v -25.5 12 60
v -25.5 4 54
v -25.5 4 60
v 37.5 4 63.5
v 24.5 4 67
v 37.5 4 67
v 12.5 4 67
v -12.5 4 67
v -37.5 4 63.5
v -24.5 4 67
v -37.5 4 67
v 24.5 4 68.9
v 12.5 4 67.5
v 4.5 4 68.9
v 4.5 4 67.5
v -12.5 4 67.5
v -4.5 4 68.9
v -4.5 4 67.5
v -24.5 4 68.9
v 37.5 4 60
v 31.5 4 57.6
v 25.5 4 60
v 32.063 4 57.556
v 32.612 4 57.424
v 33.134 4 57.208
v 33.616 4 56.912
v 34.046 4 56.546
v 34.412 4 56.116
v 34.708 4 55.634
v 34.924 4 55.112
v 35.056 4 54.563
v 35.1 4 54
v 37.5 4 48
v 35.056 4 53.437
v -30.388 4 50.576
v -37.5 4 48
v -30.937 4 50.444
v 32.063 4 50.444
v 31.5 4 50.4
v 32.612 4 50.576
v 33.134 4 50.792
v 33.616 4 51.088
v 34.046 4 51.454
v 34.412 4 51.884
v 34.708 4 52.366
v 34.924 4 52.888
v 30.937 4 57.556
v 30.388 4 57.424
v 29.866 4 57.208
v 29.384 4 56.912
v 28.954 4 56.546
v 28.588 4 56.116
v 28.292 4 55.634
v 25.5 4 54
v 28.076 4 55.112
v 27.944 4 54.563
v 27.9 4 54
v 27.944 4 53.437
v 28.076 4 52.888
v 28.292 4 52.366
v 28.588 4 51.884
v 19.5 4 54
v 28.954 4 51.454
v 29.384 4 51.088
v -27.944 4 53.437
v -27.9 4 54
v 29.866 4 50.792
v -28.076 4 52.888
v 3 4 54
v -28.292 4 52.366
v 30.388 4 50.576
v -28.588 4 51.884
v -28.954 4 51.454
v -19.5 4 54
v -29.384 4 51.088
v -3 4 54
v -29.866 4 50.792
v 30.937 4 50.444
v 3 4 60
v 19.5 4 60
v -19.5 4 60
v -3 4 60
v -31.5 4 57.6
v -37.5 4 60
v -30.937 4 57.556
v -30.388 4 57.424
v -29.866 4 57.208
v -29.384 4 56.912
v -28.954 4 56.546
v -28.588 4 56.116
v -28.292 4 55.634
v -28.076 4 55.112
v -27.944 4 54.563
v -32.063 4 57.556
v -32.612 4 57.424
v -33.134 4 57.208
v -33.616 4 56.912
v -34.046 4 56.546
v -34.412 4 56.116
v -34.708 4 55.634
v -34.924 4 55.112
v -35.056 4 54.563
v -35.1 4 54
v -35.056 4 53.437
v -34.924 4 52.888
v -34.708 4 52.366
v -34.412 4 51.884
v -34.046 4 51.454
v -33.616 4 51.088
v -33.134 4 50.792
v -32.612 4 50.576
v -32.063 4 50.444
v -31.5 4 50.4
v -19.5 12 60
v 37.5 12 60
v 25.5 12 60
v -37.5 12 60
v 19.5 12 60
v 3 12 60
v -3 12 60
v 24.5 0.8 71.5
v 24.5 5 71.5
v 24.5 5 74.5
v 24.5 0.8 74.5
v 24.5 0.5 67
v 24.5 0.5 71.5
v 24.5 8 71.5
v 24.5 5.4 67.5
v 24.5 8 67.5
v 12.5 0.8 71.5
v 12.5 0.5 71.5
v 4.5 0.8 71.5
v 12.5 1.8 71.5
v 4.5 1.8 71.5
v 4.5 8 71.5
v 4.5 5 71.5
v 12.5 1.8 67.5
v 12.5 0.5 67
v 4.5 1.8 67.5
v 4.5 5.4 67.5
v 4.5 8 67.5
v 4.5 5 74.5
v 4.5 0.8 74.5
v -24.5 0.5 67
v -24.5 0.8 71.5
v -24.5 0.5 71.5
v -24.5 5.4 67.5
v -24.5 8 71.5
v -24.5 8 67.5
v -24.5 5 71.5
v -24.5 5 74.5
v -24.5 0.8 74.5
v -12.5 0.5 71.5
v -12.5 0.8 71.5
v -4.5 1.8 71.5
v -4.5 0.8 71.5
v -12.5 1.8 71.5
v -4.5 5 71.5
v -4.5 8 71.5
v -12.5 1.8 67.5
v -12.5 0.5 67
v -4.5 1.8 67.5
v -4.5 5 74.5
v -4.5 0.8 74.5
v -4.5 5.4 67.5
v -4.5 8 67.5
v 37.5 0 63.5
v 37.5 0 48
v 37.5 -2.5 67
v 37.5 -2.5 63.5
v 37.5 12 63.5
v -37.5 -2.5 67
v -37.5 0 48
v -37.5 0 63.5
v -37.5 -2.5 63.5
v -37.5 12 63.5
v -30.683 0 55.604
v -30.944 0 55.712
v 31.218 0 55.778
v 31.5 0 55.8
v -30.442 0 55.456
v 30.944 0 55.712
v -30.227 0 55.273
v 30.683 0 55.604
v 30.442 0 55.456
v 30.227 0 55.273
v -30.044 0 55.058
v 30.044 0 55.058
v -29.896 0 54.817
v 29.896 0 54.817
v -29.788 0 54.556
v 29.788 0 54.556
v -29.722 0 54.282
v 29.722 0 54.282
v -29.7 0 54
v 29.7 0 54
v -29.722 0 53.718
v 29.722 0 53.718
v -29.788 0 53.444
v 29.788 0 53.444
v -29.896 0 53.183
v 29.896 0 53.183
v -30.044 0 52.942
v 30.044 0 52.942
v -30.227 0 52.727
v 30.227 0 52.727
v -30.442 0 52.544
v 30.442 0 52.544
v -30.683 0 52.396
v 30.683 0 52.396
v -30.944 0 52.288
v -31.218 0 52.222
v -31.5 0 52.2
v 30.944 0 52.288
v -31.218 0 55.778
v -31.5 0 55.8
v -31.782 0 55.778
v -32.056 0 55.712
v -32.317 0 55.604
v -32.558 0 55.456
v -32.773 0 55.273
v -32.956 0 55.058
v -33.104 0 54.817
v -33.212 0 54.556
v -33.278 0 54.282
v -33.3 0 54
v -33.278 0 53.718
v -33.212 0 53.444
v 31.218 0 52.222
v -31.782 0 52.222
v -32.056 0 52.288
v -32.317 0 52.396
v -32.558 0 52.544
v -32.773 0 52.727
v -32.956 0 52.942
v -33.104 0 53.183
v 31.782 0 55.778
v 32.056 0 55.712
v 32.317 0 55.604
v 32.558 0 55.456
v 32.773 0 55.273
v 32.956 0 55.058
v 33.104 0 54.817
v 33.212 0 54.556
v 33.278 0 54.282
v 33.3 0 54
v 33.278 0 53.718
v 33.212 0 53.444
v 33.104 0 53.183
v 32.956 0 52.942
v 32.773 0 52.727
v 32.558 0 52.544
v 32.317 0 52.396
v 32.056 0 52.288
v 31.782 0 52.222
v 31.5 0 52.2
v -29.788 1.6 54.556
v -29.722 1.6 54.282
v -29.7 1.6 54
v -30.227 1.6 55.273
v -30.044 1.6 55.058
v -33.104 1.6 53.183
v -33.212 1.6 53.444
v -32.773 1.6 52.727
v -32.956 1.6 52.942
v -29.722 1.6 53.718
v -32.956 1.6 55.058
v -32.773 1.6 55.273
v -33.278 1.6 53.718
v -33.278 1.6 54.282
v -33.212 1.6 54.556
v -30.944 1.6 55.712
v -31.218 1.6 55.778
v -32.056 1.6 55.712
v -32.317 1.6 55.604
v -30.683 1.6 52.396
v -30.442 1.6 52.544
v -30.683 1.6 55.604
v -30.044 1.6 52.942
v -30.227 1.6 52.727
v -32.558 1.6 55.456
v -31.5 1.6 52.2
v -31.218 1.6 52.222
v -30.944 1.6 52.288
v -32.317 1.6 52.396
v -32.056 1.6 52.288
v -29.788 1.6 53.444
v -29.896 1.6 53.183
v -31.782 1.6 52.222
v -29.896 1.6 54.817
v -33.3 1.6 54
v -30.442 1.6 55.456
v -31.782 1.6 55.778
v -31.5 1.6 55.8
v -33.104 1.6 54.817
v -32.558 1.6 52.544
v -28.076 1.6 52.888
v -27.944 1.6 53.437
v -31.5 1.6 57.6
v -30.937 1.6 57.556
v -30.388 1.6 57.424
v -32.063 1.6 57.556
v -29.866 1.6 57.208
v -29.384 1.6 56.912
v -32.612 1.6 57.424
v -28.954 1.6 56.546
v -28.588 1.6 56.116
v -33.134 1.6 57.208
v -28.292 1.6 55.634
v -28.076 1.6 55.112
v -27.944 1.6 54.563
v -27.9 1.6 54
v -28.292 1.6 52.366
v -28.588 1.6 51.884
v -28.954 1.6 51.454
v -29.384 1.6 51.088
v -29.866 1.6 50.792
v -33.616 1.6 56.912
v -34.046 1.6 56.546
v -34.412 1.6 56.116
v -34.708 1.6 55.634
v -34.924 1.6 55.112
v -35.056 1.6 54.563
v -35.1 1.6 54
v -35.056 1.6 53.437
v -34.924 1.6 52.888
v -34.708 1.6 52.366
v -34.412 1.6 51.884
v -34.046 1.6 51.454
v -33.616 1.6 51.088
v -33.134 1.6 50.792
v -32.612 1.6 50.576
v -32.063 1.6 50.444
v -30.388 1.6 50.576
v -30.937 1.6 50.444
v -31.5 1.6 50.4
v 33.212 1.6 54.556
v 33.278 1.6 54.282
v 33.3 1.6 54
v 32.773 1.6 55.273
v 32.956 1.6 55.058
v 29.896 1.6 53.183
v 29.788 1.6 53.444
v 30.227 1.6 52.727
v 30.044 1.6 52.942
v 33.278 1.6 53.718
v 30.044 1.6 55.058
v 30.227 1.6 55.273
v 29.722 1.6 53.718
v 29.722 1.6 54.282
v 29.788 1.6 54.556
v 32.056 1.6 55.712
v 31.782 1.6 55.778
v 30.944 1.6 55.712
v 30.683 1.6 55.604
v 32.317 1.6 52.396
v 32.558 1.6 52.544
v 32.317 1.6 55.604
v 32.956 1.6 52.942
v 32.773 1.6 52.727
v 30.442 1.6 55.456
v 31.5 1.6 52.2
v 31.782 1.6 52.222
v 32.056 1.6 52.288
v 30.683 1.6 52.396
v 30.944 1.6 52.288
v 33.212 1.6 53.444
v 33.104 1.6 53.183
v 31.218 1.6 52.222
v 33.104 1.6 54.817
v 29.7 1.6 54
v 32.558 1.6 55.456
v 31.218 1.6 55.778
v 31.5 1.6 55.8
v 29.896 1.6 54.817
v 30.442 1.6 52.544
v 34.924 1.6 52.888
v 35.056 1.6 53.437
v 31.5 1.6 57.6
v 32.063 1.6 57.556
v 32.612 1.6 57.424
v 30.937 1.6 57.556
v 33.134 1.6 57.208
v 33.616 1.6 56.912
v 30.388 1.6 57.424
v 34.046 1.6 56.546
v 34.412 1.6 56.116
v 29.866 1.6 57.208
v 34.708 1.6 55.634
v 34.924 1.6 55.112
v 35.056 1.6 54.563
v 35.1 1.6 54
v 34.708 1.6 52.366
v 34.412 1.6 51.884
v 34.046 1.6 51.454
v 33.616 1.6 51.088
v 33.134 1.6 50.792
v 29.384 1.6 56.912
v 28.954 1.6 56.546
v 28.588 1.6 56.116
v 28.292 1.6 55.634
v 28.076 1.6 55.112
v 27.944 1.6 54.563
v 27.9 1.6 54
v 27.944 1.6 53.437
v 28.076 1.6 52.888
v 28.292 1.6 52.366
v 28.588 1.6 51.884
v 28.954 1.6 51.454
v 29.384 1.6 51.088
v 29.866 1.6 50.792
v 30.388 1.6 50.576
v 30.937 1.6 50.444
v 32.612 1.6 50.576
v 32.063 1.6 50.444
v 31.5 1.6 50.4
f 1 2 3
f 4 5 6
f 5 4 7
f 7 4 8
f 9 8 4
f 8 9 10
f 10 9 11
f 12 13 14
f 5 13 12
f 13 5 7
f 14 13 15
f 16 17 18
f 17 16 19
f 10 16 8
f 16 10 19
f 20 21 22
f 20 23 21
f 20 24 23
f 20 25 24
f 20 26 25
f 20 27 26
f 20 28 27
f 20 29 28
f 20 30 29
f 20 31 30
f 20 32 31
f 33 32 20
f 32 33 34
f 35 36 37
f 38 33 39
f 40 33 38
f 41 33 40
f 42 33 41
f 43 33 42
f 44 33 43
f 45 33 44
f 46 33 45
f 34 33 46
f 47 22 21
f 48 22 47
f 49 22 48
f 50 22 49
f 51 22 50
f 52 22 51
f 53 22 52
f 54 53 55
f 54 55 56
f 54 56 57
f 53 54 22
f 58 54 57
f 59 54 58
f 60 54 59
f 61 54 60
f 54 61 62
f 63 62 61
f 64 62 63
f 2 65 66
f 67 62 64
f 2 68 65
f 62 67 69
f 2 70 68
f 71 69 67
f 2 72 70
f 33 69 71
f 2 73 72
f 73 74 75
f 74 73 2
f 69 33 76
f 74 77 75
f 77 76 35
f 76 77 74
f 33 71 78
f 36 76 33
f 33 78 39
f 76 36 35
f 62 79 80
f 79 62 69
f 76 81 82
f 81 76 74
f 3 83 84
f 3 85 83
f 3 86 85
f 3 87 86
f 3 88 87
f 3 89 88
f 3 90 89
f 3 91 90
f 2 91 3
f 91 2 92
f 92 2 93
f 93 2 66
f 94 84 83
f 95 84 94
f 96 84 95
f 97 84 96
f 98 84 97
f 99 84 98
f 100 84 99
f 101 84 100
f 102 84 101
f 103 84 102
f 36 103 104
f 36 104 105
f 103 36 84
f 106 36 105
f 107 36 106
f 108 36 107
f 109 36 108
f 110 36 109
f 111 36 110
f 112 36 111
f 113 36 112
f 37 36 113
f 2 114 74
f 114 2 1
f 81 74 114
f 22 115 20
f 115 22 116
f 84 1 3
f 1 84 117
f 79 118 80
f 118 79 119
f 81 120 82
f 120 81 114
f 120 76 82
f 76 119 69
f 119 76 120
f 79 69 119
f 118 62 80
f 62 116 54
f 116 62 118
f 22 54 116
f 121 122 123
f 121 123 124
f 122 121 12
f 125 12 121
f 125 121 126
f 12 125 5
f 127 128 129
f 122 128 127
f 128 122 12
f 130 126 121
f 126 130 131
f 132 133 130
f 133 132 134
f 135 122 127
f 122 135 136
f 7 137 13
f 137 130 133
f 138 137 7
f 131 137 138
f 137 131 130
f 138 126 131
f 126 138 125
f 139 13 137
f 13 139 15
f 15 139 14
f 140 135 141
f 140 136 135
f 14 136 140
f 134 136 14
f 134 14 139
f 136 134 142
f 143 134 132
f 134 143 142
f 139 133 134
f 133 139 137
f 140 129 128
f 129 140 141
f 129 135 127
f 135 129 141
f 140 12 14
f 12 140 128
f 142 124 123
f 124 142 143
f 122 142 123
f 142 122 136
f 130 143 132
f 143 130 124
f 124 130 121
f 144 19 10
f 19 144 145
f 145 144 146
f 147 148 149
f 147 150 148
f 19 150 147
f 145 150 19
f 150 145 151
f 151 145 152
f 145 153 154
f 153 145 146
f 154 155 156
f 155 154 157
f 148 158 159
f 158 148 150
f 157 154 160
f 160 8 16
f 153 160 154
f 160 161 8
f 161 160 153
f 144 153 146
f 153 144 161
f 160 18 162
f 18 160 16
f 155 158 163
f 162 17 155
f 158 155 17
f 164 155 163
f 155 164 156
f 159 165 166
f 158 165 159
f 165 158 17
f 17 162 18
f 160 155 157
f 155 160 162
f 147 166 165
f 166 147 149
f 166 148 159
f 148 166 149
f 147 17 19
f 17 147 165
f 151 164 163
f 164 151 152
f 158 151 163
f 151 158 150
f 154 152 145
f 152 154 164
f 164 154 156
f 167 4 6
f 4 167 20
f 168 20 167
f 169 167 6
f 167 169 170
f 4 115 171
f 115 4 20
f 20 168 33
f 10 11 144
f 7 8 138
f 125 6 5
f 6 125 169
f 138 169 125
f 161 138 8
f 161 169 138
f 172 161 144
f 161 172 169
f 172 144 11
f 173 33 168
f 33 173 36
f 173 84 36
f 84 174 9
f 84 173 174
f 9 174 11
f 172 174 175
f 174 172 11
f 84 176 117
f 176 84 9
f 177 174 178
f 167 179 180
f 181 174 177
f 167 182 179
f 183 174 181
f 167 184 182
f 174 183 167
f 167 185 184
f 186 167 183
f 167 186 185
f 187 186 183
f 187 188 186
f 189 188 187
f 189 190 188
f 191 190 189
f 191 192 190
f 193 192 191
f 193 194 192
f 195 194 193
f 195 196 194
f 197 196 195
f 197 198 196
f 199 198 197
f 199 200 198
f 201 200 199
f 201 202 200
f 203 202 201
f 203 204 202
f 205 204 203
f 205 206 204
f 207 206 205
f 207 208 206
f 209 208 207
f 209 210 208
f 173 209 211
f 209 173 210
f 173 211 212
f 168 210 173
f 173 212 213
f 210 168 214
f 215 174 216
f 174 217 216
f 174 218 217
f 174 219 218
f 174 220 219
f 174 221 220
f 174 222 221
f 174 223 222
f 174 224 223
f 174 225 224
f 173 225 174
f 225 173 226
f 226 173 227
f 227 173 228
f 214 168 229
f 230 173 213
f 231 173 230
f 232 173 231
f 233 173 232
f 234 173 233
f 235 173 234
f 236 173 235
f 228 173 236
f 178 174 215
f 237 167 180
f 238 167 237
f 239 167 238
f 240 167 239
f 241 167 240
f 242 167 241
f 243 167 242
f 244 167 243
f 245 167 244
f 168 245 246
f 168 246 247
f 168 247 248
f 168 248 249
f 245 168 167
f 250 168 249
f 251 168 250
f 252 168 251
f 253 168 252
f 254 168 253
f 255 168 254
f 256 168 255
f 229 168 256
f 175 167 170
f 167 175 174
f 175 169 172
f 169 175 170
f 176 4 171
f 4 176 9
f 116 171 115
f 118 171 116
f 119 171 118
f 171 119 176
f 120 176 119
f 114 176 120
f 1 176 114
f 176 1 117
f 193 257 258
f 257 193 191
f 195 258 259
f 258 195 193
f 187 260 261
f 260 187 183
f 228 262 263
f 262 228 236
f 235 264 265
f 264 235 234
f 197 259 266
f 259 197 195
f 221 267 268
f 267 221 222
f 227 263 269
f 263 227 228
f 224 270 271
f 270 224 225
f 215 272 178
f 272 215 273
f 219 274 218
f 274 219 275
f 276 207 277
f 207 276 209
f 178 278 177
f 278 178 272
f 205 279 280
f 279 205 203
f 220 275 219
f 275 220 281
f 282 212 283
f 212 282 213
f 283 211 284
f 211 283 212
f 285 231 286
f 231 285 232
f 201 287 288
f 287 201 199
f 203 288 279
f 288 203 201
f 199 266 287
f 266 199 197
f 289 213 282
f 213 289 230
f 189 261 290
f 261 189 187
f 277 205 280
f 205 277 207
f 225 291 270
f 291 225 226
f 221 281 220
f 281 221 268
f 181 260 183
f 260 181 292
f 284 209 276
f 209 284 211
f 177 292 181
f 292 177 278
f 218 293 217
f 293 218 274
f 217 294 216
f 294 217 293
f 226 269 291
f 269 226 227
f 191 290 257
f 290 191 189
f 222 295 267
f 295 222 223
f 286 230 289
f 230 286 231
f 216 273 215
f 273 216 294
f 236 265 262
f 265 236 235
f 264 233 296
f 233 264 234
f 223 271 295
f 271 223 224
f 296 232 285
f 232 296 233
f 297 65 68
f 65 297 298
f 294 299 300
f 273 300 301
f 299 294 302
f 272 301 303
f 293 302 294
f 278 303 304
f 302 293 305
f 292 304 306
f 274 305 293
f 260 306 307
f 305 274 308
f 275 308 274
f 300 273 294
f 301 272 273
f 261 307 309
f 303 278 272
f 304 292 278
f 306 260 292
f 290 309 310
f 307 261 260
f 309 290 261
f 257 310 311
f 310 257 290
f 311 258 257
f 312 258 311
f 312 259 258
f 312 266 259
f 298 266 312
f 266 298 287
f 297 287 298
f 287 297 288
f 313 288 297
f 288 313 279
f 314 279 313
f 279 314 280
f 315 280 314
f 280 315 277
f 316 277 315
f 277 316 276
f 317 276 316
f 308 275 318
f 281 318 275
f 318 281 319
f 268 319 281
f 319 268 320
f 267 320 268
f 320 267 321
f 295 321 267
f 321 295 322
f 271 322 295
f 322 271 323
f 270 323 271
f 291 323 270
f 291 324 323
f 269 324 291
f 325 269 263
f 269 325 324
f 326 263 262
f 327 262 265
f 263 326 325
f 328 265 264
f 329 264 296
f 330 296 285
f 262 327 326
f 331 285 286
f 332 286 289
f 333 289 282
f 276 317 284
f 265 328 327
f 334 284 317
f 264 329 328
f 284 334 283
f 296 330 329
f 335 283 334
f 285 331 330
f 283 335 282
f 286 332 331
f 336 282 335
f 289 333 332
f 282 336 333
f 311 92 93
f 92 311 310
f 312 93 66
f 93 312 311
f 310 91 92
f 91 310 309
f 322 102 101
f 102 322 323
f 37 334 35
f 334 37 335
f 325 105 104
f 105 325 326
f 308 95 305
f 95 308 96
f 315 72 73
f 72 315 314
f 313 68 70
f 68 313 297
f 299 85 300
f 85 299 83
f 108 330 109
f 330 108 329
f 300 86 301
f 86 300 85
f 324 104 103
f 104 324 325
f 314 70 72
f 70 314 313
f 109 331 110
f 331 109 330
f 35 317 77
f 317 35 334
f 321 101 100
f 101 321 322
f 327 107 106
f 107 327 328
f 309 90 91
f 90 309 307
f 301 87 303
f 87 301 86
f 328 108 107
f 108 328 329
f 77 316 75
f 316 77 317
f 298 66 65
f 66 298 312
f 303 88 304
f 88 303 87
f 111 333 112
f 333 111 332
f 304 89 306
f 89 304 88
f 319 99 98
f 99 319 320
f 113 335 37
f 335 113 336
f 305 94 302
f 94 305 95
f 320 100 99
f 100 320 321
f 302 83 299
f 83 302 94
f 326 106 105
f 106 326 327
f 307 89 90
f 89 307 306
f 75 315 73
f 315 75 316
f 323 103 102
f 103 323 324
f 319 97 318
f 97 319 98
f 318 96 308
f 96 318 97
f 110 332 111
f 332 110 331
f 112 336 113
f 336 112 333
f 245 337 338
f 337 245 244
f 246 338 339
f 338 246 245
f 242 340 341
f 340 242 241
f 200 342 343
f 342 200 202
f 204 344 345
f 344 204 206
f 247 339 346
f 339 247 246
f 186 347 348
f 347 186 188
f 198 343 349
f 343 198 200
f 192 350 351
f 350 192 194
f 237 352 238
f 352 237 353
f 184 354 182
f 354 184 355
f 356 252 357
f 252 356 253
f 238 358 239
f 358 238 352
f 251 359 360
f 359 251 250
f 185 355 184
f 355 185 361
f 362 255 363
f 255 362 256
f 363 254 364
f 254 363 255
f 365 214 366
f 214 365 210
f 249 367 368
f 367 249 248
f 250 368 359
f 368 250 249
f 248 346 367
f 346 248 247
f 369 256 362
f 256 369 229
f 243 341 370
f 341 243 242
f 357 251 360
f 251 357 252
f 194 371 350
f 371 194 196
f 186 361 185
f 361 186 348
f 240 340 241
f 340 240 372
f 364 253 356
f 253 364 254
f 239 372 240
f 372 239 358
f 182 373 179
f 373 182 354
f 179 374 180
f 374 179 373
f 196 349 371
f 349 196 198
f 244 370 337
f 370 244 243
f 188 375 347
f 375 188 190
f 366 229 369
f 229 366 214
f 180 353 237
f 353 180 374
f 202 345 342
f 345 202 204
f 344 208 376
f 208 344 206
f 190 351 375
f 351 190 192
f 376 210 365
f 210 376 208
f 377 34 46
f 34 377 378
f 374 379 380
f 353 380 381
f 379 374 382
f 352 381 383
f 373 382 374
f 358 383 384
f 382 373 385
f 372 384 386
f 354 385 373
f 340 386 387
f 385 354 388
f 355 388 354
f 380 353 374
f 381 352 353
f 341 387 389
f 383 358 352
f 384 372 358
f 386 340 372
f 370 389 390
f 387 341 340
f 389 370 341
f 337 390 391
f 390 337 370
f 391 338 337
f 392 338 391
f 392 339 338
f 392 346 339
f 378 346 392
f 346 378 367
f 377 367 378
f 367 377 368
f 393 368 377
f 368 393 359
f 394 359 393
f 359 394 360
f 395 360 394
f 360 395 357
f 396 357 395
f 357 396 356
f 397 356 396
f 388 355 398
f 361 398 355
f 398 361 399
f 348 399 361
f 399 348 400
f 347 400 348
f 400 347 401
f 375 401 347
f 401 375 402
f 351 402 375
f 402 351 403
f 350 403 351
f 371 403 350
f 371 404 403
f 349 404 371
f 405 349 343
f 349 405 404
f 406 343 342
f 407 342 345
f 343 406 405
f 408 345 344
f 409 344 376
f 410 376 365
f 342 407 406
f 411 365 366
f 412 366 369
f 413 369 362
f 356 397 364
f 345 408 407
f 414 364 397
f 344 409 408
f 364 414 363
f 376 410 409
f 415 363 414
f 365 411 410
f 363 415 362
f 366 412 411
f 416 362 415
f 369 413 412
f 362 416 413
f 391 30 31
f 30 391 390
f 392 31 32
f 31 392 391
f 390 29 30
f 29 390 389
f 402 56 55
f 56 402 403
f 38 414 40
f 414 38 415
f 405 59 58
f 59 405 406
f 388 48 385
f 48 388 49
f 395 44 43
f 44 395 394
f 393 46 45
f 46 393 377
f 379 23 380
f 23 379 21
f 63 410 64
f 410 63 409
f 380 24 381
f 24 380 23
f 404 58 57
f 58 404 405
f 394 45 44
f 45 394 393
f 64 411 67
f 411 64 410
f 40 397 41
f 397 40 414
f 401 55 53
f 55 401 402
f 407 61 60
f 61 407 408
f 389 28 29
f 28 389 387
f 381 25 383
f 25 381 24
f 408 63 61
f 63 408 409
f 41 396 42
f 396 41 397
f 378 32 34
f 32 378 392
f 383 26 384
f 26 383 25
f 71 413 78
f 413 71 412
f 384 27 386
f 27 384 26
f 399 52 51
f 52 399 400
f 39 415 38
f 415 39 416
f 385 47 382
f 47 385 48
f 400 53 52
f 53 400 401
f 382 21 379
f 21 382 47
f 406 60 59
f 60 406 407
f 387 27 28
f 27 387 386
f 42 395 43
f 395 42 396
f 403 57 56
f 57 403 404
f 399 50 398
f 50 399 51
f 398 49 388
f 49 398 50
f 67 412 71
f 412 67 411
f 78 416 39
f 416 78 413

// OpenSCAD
// ======================================================================
// case_holder.scad  -- AUFLAGE-SCHIENE ("Profil") + SCHIEBE-RIEGEL
//
// Bleibt FEST im Koffer (an einer kurzen Wand). Traegt den entnehmbaren
// Rahmen (Bracket+Schienen+Module), der AUFLIEGT (Flansch auf der Schiene)
// und nach oben herausgehoben wird.
//
// Halt im Koffer:
//   - Nase liegt auf der internen Kante (13 mm unter dem Rand, 2-3 mm tief)
//   - 2 Schrauben waagerecht in die Kofferwand (B)
//   - OPTIONAL: Einhaengezaehne (with_teeth) in die Wand-Rillen (<=1 mm
//     dick, <=2 mm lang) - Variante zum Ausprobieren.
//   Bleibt komplett unter dem Dichtrand (Deckel schliesst).
//
// SICHERUNG (Schiebe-Riegel, eigenes Druckteil):
//   Nach dem Einlegen des Rahmens wird der Riegel von oben nach INNEN
//   geschoben; sein Balken legt sich ueber die Oberkante des Bracket-
//   Flansches (z=74) -> Rahmen kann nicht mehr hoch. Zurueckschieben =
//   offen. Gefuehrt zwischen zwei L-Schienen (greifen ueber die Riegel-
//   kanten und halten ihn nieder); ein mittiger Griff steht ZWISCHEN den
//   Schienen nach oben und ist von oben mit dem Finger bedienbar. Alles
//   bleibt unter dem Dichtrand (80 mm).
//
// Koordinaten (Koffer-Einbaulage):
//   X = entlang der kurzen Wand (Schienen-Laengsrichtung)
//   Y = von der Wand nach innen; Wand-Innenflaeche (untere Wand) bei Y=0
//   Z = senkrecht; Boden=0, interne Kante=67, Dichtrand=80
// ======================================================================
$fn = 40;

// ---- gemessene Koffer-/Rahmen-Werte ----
ledge_z      = 67;    // interne Kante (13 mm unter Rand 80)
rim_z        = 80;    // Dichtrand (tabu darueber)
ledge_lip    = 2.5;   // wie weit die Kante nach aussen vorsteht (2-3 mm)
// Der Rahmen HAENGT jetzt an seiner FRONT-Kante (Flansch am Bracket-Z=0):
// Front zeigt nach oben, Modulkoerper haengen in den Koffer. rest_z ist die
// Auflageflaeche (Flansch-Unterseite). Tiefer als die Kante (67) gesetzt,
// damit die Front ~16 mm unter der Oeffnung liegt -> Luft fuer Kabel/Potis.
rest_z       = 63.5;  // Oberkante Auflage = Unterseite Rahmen-Flansch
flange_top_z = rest_z + 4;  // Oberkante haengender Flansch (=Front) = 67.5
                            //   -> knapp UEBER Kantenhoehe 67: der Hebel liegt
                            //   direkt auf dem Flansch (kein Spiel, haelt fest),
                            //   raeumt aber die Nase (67) beim Schwenken frei.
nose_top_z   = ledge_z;     // Nase reicht auf Kantenhoehe 67 (haengt an der Kante)
flange_y0    = 7;     // Flansch in Y von 7 (aussen) ..
flange_y1    = 15;    //   .. 15 (siehe Passung-Check im Bracket)

// ---- Profil-Masse ----
prof_len       = 75;    // KURZ: 2 je Wand in die freien End-Zonen des Brackets
                        //   (0..86mm und 225..311mm). Die Verstaerkungs-Kloetze an
                        //   den Segment-Stoessen (Sperrzonen 86..122 und 189..225mm)
                        //   reichen bis auf Auflagehoehe -> ein Profil DORT wuerde den
                        //   Rahmen aufbocken. Darum kurz + an die Enden.
web_t          = 4;     // Dicke der Rueckwand (gegen die Kofferwand)
shelf_in       = 8;     // wie weit die Auflage nach innen reicht
shelf_t        = 3.5;   // Dicke der Auflage
web_bot_z      = 48;    // Rueckwand reicht so weit nach unten (fuer Schrauben)
gusset         = 6;     // Dreiecks-Verstaerkung unter der Auflage

// ---- Schrauben (B), waagerecht in die Kofferwand ----
// Eine Reihe TIEF, damit Kopf/Senkung nicht in die Flansch-/Auflage-Ebene
// (>=60) ragt (dort brach der Nutzer eine ueberlappende Kante ab).
screw_d        = 3.6;   screw_head_d = 7.2;   screw_head_t = 2.4;
screw_z        = [ 54 ];   // Kopf 50.4..57.6, klar unter Auflage (60) & Flansch (63.5)

// ---- Einhaengezaehne (optional, Variante) ----
with_teeth   = false;  // true = Zaehne an der Nase, greifen in die Wand-Rillen
tooth_th     = 1.0;    // Spitzen-Dicke (Y) - <= 1 mm (Spitze muss in die Rille);
                       //   Basis ist per Taper dicker -> bricht nicht mehr ab
tooth_len    = 6.0;    // Laenge nach unten (Z) - LANG bleibt (guter Halt, war ok)
tooth_w      = 4.0;    // Breite (X) - groesser
tooth_pitch  = 8;      // Zahn-Abstand (gleich wie vorher)
tooth_base_th= 2.4;    // Dicke (Y) an der Wurzel (Taper von 1 mm Spitze -> hier)

// ---- SCHNAPP-/KLICK-Verschluss (Sicherung) ----
// Biegsame Rast-Zunge am Profil: HOCH in Z (steif -> haelt den Flansch nieder,
// auch bei Erschuetterung), aber DUENN in Y (biegt seitlich zum Loesen). Der
// Haken oben rastet ueber die Flansch-Oberkante; eine Einlauf-Schraege laesst
// die Zunge beim Einlegen automatisch wegfedern und dann einschnappen.
// Loesen: Griff-Steg zur Wand druecken, Rahmen hoch. Optionale Transport-
// Schraube (with_tscrew) klemmt die Zunge zusaetzlich fest.
with_riegel  = true;
snap_n       = 2;             // Zungen je Profil
snap_x       = 17;            // |X|-Position der Zungen
snap_len     = 30;           // Zungen-Laenge (X)
snap_yt      = 2.2;          // Zungen-Dicke (Y) - die federnde Zunge an der Wand
snap_y       = 1.8;          // Zunge/Saeule GANZ an die Wand (Y=1.8..4.0, ueber die
                             //   Rueckwand). NICHTS auf der Auflage (Y>=4) -> Bracket flach.
snap_z0      = flange_top_z; // 67.5 Arm-Unterkante = Flansch-Oberkante
snap_z1      = snap_z0 + 4;  // 71.5
hook_reach   = 4.0;          // Arm bis Y=8 -> ~1 mm Ueberdeckung ueber die Flansch-Kante (7)
hook_h       = 4.0;          // Arm VOLL HOCH (war 2.2 duenne Lippe -> brach): massiver
                             //   Balken z=67.5..71.5, biegt/bricht nicht mehr
arm_w        = 20;           // Arm-BREITE (X) - war 8, jetzt richtig breit (viel Platz da)
anchor_w     = 12;           // BREITE der Verbindung/Hals (X), womit der Arm am Profil
                             //   sitzt - >= halbe Arm-Breite (war nur 4 -> Arm brach ab)
single_arm   = false;        // false = 2 Arme (FESTE Seite); true = 1 Arm mittig (LOESE-Seite)
neck_single  = 6;            // Anker-Breite der Loese-Seite (halb so breit)
flex_len     = 26;           // Laenge der waagerechten Feder-Zunge (X) = Federweg
flex_w       = 10;           // Breite von Hook/Griff (X) der Feder-Zunge

// ---- SEPARATER Feder-CLIP (Loese-Seite): Profil B wird FLACH mit Zaehnen
//   gedruckt (Zaehne stark) + Schlitz; der Clip steckt hinein und wird AUFRECHT
//   einzeln gedruckt -> die Feder-Zunge biegt in der Layer-Ebene = bruchfest.
with_clipslot = false;       // true = Schlitz fuer den Clip in die Rueckwand (Profil B flach)
clip_len      = 28;          // Gesamtlaenge Clip (X)
clip_foot_w   = 12;          // Fuss-Breite (X), steckt im Schlitz
clip_foot_t   = 2.6;         // Fuss-Dicke (Y)
clip_yt       = 2.8;         // Zungen-Dicke (Y) - federt, aber robust (aufrecht = Layer-Ebene)
clip_foot_z0  = web_bot_z + 8;  // Fuss-Unterkante (steckt bis hier runter im Schlitz)
clip_barb_h   = 0.7;            // Ueberstand der Schnapp-Nase (Rast gegen Herausziehen)
clip_barb_z0  = clip_foot_z0 + 2;  // Nase sitzt hier (rastet in den Schlitz-Recess)
clip_screw_d  = 3.2;            // optionales Schraubloch (selbstschneidend, Transport-Sicherung)
arm_count    = 2;            // 2 = Profil 1 (FEST, 2 Arme); 1 = Profil 2 (FEDERND, 1 Arm mittig)
                             //   Profil 2: mit -D arm_count=1 -D anchor_w=6 exportieren
with_grip    = false;        // Profil-1-Griff-Variante: zentraler Hebel-Steg nach OBEN
                             //   (Modul-Richtung) zum Rauskippen. Mit -D with_grip=true
grip_top_z   = 77;           // Oberkante Griff-Steg (unter Dichtrand 80)
grip_z       = snap_z1 + 3;  // 74.5 Griff-Steg-Oberkante (unter Rand 80)
snap_slot    = 1.4;          // Spalt hinter/neben der Zunge (Federweg + Druck)
with_tscrew  = false;        // optionale Transport-Schraube (klemmt die Zunge)
tscrew_pilot = 2.6;

render_part = 0;   // 0=Profil+Hebel (offen), 1=Profil druckfertig, 2=Hebel druckfertig,
                   // 3=Kontroll: Profil+Hebel ZU (+Flansch-Attrappe), 4=Draufsicht offen+zu

// ----------------------------------------------------------------------
// Einhaengezaehne (Stueck B): sitzen an der NASEN-UNTERSEITE - der Flaeche,
// die auf der Kante aufliegt - und zeigen nach UNTEN in die waagerechten
// Rillen der Kante. Reihe entlang der Wand (X), Abstand tooth_pitch (<=20mm).
// tooth_th (<=1 mm) duenn in Y (quer zur Rille), tooth_len (<=2 mm) tief nach
// unten. tooth_w breit in X (entlang der Rille). Beim Aufsetzen des Profils
// fallen die Zaehne in die Rillen und haengen sich ein.
// Nasen-Unterseite liegt bei z = ledge_z - shelf_t; Zaehne ragen von dort
// tooth_len nach unten. Mittig ueber der Kante (Y = -ledge_lip .. 0).
tooth_y = -ledge_lip + tooth_th/2;   // Zaehne an der AEUSSERSTEN Kante von B
                                     // (Aussenflaeche buendig mit der Nasen-Aussenkante Y=-ledge_lip)
module hook_teeth() {
    for (x = [-prof_len/2 + 15 : tooth_pitch : prof_len/2 - 15]) {
        yo = tooth_y - tooth_th/2;                        // Aussenflaeche (buendig Nasenkante)
        // duenne Spitze, volle Laenge -> passt in die Rille, guter Halt
        translate([x - tooth_w/2, yo, ledge_z - shelf_t - tooth_len])
            cube([tooth_w, tooth_th, tooth_len + 0.6]);   // X=Breite, Y=1mm duenn, Z=nach unten
        // Wurzel-Taper: obere 2 mm von 1 mm auf tooth_base_th aufweiten -> bricht nicht ab
        hull() {
            translate([x - tooth_w/2, yo, ledge_z - shelf_t - 2.0]) cube([tooth_w, tooth_th, 0.1]);
            translate([x - tooth_w/2, yo, ledge_z - shelf_t])        cube([tooth_w, tooth_base_th, 0.6]);
        }
    }
}

// Rast-Zunge (Teil des Profils): am AUSSEREN Ende verankert, Cantilever zur
// Mitte. Duenn in Y (federt seitlich zum Loesen), hoch in Z (steif -> haelt
// den Flansch nieder). Am freien Ende ein Haken ueber den Flansch + Einlauf-
// Schraege (Flansch drueckt die Zunge beim Einlegen weg, dann Klick) + Griff.
module one_snap() {                              // rechter Schnapper (X>0)
    xa = prof_len/2 - 3;
    xf = xa - snap_len;                          // Arm-Ende (Mitte-waerts)
    // BREITE Verbindung (Hals): solide Wand unter dem Arm auf der Wandseite
    // (Y=0.5..4), von der Rueckwand hoch bis zur Arm-Ebene. anchor_w breit
    // (>= halbe Arm-Breite) -> der Arm sitzt satt am Profil statt an duennem Hals.
    translate([xf + arm_w - anchor_w, 0.5, ledge_z - 4])
        cube([anchor_w, snap_y + snap_yt - 0.5, snap_z1 - (ledge_z - 4)]);
    // Basis-Steg unter dem Arm (volle Arm-Breite) - traegt den Haken
    translate([xf, snap_y, snap_z0]) cube([arm_w, snap_yt, snap_z1 - snap_z0]);
    // Haken/Arm ueber den Flansch (45°-Einlauf unten-innen)
    translate([xf, snap_y + snap_yt, snap_z0]) rotate([90, 0, 90])
        linear_extrude(height = arm_w)
            polygon([[1.4, 0], [hook_reach, 0], [hook_reach, hook_h],
                     [0, hook_h], [0, 1.4]]);
    // Griff-Steg
    translate([xf, snap_y - 1, snap_z1]) cube([arm_w, snap_yt + 2, grip_z - snap_z1]);
}
module one_snap_center() {                       // Profil 2 (LOESE-Seite): EIN federnder Arm
    // WAAGERECHTE Feder-Zunge: verankert rechts, Hook am freien (linken) Ende.
    // Biegt in Y in der XY-Ebene -> hochkant gedruckt federt sie IN der Layer-Ebene
    // (bruchfest) und laesst sich zum Loesen wegdruecken. Grob mittig auf dem Profil.
    xa = flex_len/2;                             // Anker rechts
    xf = -flex_len/2;                            // freies Ende (Hook/Griff) links
    // schmaler Anker verbindet die Zunge mit dem Profil
    translate([xa - neck_single, 0.5, ledge_z - 4])
        cube([neck_single, snap_y + snap_yt - 0.5, snap_z1 - (ledge_z - 4)]);
    // duenne, lange Zunge -> federt weich in Y
    translate([xf, snap_y, snap_z0]) cube([flex_len - neck_single, snap_yt, snap_z1 - snap_z0]);
    // Hook am freien Ende ueber den Flansch (45°-Einlauf)
    translate([xf, snap_y + snap_yt, snap_z0]) rotate([90, 0, 90])
        linear_extrude(height = flex_w)
            polygon([[1.4, 0], [hook_reach, 0], [hook_reach, hook_h], [0, hook_h], [0, 1.4]]);
    // Griff zum Wegdruecken (loesen)
    translate([xf, snap_y - 1, snap_z1]) cube([flex_w, snap_yt + 2, grip_z - snap_z1]);
}
module snap_hooks() {
    if (arm_count == 1) one_snap_center();       // Profil 2 (federnd)
    else { one_snap(); mirror([1, 0, 0]) one_snap(); }  // Profil 1 (fest, unveraendert)
}

// Schlitz in der Rueckwand (mittig) fuer den Clip-Fuss (nur Profil B, flach)
module clip_slot() {
    translate([-0.2, 0.9, clip_foot_z0 - 1])
        cube([clip_foot_w + 0.4, clip_foot_t + 0.3, nose_top_z - (clip_foot_z0 - 1) + 0.1]);
    // Recess fuer die Schnapp-Nase (die Innenwand ist hier freigestellt, oben bleibt
    // sie stehen -> die Nase rastet ein und faengt beim Herausziehen)
    translate([1.5, 3.3, clip_barb_z0 - 1])
        cube([clip_foot_w - 3, 1.5, 3]);
}
// Separater Feder-CLIP: Fuss (steckt im Schlitz) + waagerechte Feder-Zunge +
// Hook ueber den Flansch + Griff. AUFRECHT drucken (render_part=8) -> die Zunge
// federt in Y in der Layer-Ebene = bruchfest. Loesen: Griff wegdruecken.
module flex_clip() {
    tl = clip_len - clip_foot_w;                 // Zungenlaenge (freies Teil)
    difference() {
        union() {
            // Fuss (X=0..clip_foot_w) - steckt im Schlitz
            translate([0, 1.0, clip_foot_z0]) cube([clip_foot_w, clip_foot_t, snap_z1 - clip_foot_z0]);
            // Schnapp-Nase an der Fuss-Innenseite: Rampe unten (reindruecken), flach
            // oben (faengt beim Herausziehen). Rastet in den Schlitz-Recess.
            translate([2, 1.0 + clip_foot_t, clip_barb_z0]) rotate([90, 0, 90])
                linear_extrude(clip_foot_w - 4)
                    polygon([[0, 0], [clip_barb_h, 1.0], [0, 2.0]]);
            // Feder-Zunge (X=-tl..0), duenn in Y
            translate([-tl, snap_y, snap_z0]) cube([tl, clip_yt, snap_z1 - snap_z0]);
            // Hook am freien Ende ueber den Flansch (45°-Einlauf)
            translate([-tl, snap_y + clip_yt, snap_z0]) rotate([90, 0, 90])
                linear_extrude(height = flex_w)
                    polygon([[1.4, 0], [hook_reach, 0], [hook_reach, hook_h], [0, hook_h], [0, 1.4]]);
            // Griff
            translate([-tl, snap_y - 1, snap_z1]) cube([flex_w, clip_yt + 2, grip_z - snap_z1]);
        }
        // optionales Schraubloch (durch den Fuss, Transport-Sicherung in die Wand)
        translate([clip_foot_w/2, 1.0 + clip_foot_t + 0.5, clip_foot_z0 + 9]) rotate([90, 0, 0])
            cylinder(d = clip_screw_d, h = clip_foot_t + 2, $fn = 24);
    }
}

module grip_lever() {                            // Profil-1-Griff: zentraler Hebel-Steg nach OBEN
    translate([-5, web_t - 2.5, nose_top_z])     //   (Modul-Richtung), an der Nasen-Innenseite hoch
        cube([10, 2.5, grip_top_z - nose_top_z]);
    translate([-9, web_t - 2.5, grip_top_z - 2.5]) // breiter T-Kopf, innen ueberstehend -> zum Untergreifen
        cube([18, 5, 2.5]);
}

module profil() {
    difference() {
        union() {
            translate([-prof_len/2, 0, web_bot_z])                       // Rueckwand (bis Nasen-Oberkante)
                cube([prof_len, web_t, nose_top_z - web_bot_z]);
            translate([-prof_len/2, -ledge_lip, ledge_z - shelf_t])      // Nase auf der Kante (fest 63.5..70)
                cube([prof_len, ledge_lip + web_t, nose_top_z - (ledge_z - shelf_t)]);
            translate([-prof_len/2, web_t, rest_z - shelf_t])            // Auflage nach innen (tiefer, 56.5..60)
                cube([prof_len, shelf_in, shelf_t]);
            for (gx = [-prof_len/2 + 12, -gusset/2, prof_len/2 - 12 - gusset]) // Gussets (mittleres zentriert)
                translate([gx, web_t, rest_z - shelf_t])
                    rotate([90, 0, 90]) linear_extrude(height = gusset)
                        polygon([[0,0],[shelf_in,0],[0,-gusset]]);
            if (with_teeth)  hook_teeth();
            if (with_riegel) snap_hooks();
            if (with_grip)   grip_lever();
        }
        for (z = screw_z)                                                // Wandschrauben
            for (x = [-prof_len/2 + 6, prof_len/2 - 6])                   // GANZ AUSSEN (klar an den Stütz-Gussets vorbei, auch bei schmalem Profil B)
                translate([x, web_t + 0.5, z]) rotate([90, 0, 0]) {
                    cylinder(d = screw_d, h = web_t + ledge_lip + 2);
                    cylinder(d = screw_head_d, h = screw_head_t + 0.5);
                }
        if (with_clipslot) clip_slot();   // Schlitz fuer den Feder-Clip (Profil B, flach)
    }
}

// ======================================================================
flange_dummy_col = "#3d86c6";
module flange_dummy() {                        // Rahmen-Flansch-Attrappe (zum Kontrollieren)
    translate([-prof_len/2, flange_y0, rest_z])
        cube([prof_len, flange_y1 - flange_y0, flange_top_z - rest_z]);
}
if (render_part == 0) {                        // Profil mit Snap-Zungen (Einbaulage)
    profil();
} else if (render_part == 1) {                 // Profil druckfertig (flach)
    rotate([-90, 0, 0]) translate([0, -web_bot_z, 0]) profil();
} else if (render_part == 2) {                 // = 0
    profil();
} else if (render_part == 3) {                 // Kontroll: Profil + Flansch-Attrappe
    color("#3f9e6c") profil();
    color(flange_dummy_col) flange_dummy();
} else if (render_part == 4) {                 // = 3
    color("#3f9e6c") profil();
    color(flange_dummy_col) flange_dummy();
} else if (render_part == 5) {                // VOLLMONTAGE: Profil (Snap) + echtes
    color("#3f9e6c") profil();                //   Bracket-Segment in Einbaulage (haengend)
    // export/segment_1.stl: (ex=Bracket-Hoehe, ey=Bracket-Y, ez=Laenge) ->
    // Koffer: case_x=ez-55, case_y=23-ey, case_z=flange_top_z-ex
    color([0.24,0.52,0.78]) multmatrix([[0,0,1,-55],[0,-1,0,23],[-1,0,0,flange_top_z],[0,0,0,1]])
        import("export/segment_1.stl");
    // Boden/Rand-Referenz
    color([0.8,0.8,0.8,0.25]) translate([-prof_len/2, -6, 0]) cube([prof_len, 60, 1]);   // Boden z=0
} else if (render_part == 7) {                // Profil HOCHKANT-druckfertig (fuer den
    translate([0, 0, -web_bot_z]) profil();   //   federnden Arm: Feder biegt in Layer-Ebene)
} else if (render_part == 8) {                // Feder-CLIP allein, AUFRECHT druckfertig
    translate([0, 0, -clip_foot_z0]) flex_clip();
} else if (render_part == 9) {                // Kontrolle: Profil B (flach) + Clip gesteckt + Flansch
    color("#3f9e6c") profil();
    color("#e08a2a") flex_clip();
    color(flange_dummy_col) flange_dummy();
}
